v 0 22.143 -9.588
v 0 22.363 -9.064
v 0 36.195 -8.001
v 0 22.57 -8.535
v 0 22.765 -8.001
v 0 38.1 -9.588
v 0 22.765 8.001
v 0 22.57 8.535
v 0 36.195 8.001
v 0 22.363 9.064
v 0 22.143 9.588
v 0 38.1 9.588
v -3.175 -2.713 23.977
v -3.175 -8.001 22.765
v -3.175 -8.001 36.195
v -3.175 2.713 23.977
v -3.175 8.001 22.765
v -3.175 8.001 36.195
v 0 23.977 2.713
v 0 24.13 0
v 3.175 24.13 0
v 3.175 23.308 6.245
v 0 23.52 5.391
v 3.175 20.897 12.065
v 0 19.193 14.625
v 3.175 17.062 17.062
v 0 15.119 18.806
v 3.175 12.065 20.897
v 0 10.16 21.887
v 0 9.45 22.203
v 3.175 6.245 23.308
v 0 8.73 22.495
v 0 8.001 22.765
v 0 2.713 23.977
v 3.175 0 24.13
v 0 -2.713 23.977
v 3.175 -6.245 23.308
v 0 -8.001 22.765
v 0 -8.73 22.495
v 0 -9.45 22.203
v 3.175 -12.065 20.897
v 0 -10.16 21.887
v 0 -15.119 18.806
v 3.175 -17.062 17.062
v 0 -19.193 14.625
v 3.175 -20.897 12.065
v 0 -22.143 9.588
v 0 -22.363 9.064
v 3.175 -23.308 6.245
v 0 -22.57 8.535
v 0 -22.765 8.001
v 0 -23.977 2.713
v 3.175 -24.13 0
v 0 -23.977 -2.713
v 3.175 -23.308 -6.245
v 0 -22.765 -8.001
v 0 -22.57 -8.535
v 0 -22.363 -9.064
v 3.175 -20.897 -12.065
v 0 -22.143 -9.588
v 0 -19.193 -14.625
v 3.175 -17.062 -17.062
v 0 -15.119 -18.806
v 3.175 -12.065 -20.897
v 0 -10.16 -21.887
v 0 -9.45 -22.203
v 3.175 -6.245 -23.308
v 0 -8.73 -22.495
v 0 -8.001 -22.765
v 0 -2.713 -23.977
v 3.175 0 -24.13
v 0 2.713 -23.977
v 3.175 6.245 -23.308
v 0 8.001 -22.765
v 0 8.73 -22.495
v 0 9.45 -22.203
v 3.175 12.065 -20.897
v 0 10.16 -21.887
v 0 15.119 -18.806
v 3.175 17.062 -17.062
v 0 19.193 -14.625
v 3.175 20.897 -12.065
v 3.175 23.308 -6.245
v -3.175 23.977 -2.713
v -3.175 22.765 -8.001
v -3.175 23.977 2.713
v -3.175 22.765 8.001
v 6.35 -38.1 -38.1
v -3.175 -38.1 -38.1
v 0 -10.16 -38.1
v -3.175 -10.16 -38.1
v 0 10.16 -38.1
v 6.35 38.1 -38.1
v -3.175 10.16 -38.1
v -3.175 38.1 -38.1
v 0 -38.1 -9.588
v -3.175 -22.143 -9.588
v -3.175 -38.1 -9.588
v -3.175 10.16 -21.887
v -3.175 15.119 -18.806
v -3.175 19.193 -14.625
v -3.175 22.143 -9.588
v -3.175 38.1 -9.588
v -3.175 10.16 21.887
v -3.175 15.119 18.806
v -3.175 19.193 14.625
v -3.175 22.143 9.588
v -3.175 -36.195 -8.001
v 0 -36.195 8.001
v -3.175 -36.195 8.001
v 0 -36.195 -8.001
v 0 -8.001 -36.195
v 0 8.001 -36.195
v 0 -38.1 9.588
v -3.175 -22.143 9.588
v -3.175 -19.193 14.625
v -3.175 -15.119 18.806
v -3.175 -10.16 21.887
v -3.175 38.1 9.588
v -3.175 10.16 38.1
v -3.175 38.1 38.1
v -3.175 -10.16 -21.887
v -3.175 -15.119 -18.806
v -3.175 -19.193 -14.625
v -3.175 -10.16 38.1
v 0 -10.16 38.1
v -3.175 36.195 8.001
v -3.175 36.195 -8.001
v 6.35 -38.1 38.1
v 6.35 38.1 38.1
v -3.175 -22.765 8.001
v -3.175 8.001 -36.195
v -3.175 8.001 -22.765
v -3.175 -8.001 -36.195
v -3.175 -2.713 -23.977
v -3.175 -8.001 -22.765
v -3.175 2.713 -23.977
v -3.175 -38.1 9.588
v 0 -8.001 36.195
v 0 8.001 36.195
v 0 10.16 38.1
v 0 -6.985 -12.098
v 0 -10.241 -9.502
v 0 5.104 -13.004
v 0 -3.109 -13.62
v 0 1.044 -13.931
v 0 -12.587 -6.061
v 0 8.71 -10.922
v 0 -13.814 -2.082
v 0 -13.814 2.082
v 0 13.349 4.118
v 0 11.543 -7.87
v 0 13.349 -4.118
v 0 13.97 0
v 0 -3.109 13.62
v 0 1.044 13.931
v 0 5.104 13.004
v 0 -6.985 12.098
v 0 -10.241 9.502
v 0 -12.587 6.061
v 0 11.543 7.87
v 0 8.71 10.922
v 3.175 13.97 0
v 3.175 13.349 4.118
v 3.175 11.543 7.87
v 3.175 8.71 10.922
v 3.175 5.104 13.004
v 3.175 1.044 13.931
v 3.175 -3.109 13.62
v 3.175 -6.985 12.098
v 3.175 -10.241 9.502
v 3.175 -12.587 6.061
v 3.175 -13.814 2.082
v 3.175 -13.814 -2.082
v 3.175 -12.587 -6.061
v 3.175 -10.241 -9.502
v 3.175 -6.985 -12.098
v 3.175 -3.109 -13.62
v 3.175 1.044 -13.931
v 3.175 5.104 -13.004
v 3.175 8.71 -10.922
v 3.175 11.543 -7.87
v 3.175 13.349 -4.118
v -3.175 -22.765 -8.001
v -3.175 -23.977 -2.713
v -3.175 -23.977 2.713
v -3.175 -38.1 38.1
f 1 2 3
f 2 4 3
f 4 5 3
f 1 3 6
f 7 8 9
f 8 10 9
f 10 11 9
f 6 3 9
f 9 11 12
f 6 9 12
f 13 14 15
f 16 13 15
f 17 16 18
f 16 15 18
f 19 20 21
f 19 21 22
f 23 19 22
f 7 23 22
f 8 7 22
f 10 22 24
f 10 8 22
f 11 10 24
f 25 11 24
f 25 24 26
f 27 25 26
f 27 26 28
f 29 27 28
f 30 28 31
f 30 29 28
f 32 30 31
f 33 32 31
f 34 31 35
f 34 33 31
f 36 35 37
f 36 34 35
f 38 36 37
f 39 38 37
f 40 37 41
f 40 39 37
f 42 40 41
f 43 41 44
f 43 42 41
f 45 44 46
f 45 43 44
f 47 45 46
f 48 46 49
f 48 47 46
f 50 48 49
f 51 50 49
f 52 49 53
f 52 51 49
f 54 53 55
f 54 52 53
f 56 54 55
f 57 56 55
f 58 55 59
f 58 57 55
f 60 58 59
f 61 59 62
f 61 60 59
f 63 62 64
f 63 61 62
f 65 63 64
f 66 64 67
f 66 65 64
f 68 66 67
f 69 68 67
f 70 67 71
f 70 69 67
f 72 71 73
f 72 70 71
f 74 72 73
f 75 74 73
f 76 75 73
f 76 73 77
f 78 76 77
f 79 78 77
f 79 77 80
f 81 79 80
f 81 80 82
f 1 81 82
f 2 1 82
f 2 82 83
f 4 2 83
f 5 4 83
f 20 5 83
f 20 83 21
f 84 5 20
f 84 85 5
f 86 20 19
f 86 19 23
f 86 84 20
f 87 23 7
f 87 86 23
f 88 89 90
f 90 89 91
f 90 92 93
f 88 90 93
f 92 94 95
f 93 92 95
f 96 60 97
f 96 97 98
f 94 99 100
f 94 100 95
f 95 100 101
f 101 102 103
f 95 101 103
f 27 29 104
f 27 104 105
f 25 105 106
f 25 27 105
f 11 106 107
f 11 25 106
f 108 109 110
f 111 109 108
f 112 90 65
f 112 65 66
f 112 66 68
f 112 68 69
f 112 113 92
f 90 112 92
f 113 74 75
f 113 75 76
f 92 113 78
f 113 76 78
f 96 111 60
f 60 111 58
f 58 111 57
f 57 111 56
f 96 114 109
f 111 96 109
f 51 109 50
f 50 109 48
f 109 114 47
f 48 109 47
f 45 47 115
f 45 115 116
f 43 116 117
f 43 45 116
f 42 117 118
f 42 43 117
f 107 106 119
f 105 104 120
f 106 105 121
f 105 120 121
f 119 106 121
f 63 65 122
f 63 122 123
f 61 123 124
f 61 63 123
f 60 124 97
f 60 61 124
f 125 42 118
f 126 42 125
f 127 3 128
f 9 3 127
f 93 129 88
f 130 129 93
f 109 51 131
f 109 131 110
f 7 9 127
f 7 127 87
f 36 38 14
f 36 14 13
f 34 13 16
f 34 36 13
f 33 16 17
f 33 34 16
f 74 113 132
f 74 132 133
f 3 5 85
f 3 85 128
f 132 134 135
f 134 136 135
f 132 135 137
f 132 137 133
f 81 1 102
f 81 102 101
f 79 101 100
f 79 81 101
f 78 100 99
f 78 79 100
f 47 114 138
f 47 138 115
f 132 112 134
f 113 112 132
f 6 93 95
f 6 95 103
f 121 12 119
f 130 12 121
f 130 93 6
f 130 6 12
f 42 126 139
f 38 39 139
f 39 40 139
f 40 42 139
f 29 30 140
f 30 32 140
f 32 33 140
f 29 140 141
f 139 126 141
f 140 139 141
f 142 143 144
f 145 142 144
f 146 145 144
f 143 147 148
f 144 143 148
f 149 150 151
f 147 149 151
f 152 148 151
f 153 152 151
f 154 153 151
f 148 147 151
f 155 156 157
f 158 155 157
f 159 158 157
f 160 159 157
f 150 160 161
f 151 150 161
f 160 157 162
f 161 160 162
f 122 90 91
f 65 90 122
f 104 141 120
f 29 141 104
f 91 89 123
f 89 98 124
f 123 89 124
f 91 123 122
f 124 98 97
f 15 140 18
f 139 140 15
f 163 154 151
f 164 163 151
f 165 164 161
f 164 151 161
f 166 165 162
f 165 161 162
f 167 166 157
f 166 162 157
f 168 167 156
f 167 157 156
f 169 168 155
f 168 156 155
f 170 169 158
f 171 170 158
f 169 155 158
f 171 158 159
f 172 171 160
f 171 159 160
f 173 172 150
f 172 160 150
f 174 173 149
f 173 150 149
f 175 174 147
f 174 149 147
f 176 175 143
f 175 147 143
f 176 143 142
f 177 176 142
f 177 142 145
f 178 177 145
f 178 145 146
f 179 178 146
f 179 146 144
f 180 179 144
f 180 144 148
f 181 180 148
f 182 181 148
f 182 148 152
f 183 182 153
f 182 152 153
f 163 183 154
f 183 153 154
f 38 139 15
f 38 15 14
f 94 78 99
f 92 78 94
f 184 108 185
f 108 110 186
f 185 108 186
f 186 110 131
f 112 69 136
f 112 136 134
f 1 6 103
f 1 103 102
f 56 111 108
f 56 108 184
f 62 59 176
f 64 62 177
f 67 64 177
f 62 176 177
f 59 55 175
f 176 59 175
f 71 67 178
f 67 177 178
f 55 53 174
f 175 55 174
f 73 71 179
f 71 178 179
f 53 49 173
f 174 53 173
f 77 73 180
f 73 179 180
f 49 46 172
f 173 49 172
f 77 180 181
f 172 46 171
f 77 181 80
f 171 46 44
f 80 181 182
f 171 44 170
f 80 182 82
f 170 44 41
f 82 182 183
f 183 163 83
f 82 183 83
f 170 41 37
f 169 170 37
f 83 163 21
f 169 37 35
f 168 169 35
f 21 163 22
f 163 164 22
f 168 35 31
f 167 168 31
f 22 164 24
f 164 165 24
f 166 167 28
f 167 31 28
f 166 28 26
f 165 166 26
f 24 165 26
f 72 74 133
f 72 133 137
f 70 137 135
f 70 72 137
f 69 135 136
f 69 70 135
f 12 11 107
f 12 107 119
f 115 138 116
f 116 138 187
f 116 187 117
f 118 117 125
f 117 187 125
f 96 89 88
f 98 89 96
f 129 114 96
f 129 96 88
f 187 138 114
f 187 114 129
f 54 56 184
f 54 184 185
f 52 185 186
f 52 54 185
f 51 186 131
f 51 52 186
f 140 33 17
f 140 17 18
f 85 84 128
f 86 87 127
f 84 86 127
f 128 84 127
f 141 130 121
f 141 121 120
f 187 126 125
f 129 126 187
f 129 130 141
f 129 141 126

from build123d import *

# Parameters (mm, degrees)
F0_W     = 76.2
F0_H     = 76.2
F0_R     = 24.13
F0_R_2   = 13.97
F1_DEPTH = 6.35
F3_DEPTH = 3.175
F5_DEPTH = 3.175


# Not quite as in the source:
# - after a boolean that leaves OpenCascade's solid faulty, fix() repairs it


with BuildPart() as f1:
    # F0 (on Right) → F1 (new body)
    with BuildSketch(Plane.YZ):
        Rectangle(F0_W, F0_H)
        Circle(F0_R, mode=Mode.SUBTRACT)
        Circle(F0_R)
        Circle(F0_R_2, mode=Mode.SUBTRACT)
        Circle(F0_R_2)
    extrude(amount=F1_DEPTH)

    # F0 (on Right) → F3 (cut)
    with BuildSketch(Plane.YZ):
        Circle(F0_R)
        Circle(F0_R_2, mode=Mode.SUBTRACT)
    extrude(amount=F3_DEPTH, mode=Mode.SUBTRACT)

    # F4 (on face) → F5 (join)
    with BuildSketch(Plane.YZ):
        with BuildLine():
            Line((38.1, 9.5882897328), (38.1, 38.1))
            Line((38.1, 38.1), (10.16, 38.1))
            Line((10.16, 38.1), (10.16, 21.8867836833))
            ThreePointArc((10.16, 21.8867836833), (17.2825787445, 16.8395181624), (22.1432066332, 9.5882897328))
            Line((22.1432066332, 9.5882897328), (38.1, 9.5882897328))
        make_face()
        with BuildLine():
            Line((38.1, -38.1), (38.1, -9.5882897328))
            Line((38.1, -9.5882897328), (22.1432066332, -9.5882897328))
            ThreePointArc((22.1432066332, -9.5882897328), (17.2825787445, -16.8395181624), (10.16, -21.8867836833))
            Line((10.16, -21.8867836833), (10.16, -38.1))
            Line((10.16, -38.1), (38.1, -38.1))
        make_face()
        with BuildLine():
            Line((-10.16, 21.8867836833), (-10.16, 38.1))
            Line((-10.16, 38.1), (-38.1, 38.1))
            Line((-38.1, 38.1), (-38.1, 9.5882897328))
            Line((-38.1, 9.5882897328), (-22.1432066332, 9.5882897328))
            ThreePointArc((-22.1432066332, 9.5882897328), (-17.2825787445, 16.8395181624), (-10.16, 21.8867836833))
        make_face()
        with BuildLine():
            Line((-38.1, -9.5882897328), (-38.1, -38.1))
            Line((-38.1, -38.1), (-10.16, -38.1))
            Line((-10.16, -38.1), (-10.16, -21.8867836833))
            ThreePointArc((-10.16, -21.8867836833), (-17.2825787445, -16.8395181624), (-22.1432066332, -9.5882897328))
            Line((-22.1432066332, -9.5882897328), (-38.1, -9.5882897328))
        make_face()
        with BuildLine():
            Line((36.195, -8.001), (36.195, 8.001))
            Line((36.195, 8.001), (22.7649049855, 8.001))
            ThreePointArc((22.7649049855, 8.001), (24.13, 0), (22.7649049855, -8.001))
            Line((22.7649049855, -8.001), (36.195, -8.001))
        make_face()
        with BuildLine():
            Line((-22.7649049855, 8.001), (-36.195, 8.001))
            Line((-36.195, 8.001), (-36.195, -8.001))
            Line((-36.195, -8.001), (-22.7649049855, -8.001))
            ThreePointArc((-22.7649049855, -8.001), (-24.13, 0), (-22.7649049855, 8.001))
        make_face()
        with BuildLine():
            Line((8.001, 22.7649049855), (8.001, 36.195))
            Line((8.001, 36.195), (-8.001, 36.195))
            Line((-8.001, 36.195), (-8.001, 22.7649049855))
            ThreePointArc((-8.001, 22.7649049855), (0, 24.13), (8.001, 22.7649049855))
        make_face()
        with BuildLine():
            Line((-8.001, -36.195), (8.001, -36.195))
            Line((8.001, -36.195), (8.001, -22.7649049855))
            ThreePointArc((8.001, -22.7649049855), (0, -24.13), (-8.001, -22.7649049855))
            Line((-8.001, -22.7649049855), (-8.001, -36.195))
        make_face()
    extrude(amount=-F5_DEPTH)

    add(f1.part.fix(), mode=Mode.REPLACE)


solid = f1.part
